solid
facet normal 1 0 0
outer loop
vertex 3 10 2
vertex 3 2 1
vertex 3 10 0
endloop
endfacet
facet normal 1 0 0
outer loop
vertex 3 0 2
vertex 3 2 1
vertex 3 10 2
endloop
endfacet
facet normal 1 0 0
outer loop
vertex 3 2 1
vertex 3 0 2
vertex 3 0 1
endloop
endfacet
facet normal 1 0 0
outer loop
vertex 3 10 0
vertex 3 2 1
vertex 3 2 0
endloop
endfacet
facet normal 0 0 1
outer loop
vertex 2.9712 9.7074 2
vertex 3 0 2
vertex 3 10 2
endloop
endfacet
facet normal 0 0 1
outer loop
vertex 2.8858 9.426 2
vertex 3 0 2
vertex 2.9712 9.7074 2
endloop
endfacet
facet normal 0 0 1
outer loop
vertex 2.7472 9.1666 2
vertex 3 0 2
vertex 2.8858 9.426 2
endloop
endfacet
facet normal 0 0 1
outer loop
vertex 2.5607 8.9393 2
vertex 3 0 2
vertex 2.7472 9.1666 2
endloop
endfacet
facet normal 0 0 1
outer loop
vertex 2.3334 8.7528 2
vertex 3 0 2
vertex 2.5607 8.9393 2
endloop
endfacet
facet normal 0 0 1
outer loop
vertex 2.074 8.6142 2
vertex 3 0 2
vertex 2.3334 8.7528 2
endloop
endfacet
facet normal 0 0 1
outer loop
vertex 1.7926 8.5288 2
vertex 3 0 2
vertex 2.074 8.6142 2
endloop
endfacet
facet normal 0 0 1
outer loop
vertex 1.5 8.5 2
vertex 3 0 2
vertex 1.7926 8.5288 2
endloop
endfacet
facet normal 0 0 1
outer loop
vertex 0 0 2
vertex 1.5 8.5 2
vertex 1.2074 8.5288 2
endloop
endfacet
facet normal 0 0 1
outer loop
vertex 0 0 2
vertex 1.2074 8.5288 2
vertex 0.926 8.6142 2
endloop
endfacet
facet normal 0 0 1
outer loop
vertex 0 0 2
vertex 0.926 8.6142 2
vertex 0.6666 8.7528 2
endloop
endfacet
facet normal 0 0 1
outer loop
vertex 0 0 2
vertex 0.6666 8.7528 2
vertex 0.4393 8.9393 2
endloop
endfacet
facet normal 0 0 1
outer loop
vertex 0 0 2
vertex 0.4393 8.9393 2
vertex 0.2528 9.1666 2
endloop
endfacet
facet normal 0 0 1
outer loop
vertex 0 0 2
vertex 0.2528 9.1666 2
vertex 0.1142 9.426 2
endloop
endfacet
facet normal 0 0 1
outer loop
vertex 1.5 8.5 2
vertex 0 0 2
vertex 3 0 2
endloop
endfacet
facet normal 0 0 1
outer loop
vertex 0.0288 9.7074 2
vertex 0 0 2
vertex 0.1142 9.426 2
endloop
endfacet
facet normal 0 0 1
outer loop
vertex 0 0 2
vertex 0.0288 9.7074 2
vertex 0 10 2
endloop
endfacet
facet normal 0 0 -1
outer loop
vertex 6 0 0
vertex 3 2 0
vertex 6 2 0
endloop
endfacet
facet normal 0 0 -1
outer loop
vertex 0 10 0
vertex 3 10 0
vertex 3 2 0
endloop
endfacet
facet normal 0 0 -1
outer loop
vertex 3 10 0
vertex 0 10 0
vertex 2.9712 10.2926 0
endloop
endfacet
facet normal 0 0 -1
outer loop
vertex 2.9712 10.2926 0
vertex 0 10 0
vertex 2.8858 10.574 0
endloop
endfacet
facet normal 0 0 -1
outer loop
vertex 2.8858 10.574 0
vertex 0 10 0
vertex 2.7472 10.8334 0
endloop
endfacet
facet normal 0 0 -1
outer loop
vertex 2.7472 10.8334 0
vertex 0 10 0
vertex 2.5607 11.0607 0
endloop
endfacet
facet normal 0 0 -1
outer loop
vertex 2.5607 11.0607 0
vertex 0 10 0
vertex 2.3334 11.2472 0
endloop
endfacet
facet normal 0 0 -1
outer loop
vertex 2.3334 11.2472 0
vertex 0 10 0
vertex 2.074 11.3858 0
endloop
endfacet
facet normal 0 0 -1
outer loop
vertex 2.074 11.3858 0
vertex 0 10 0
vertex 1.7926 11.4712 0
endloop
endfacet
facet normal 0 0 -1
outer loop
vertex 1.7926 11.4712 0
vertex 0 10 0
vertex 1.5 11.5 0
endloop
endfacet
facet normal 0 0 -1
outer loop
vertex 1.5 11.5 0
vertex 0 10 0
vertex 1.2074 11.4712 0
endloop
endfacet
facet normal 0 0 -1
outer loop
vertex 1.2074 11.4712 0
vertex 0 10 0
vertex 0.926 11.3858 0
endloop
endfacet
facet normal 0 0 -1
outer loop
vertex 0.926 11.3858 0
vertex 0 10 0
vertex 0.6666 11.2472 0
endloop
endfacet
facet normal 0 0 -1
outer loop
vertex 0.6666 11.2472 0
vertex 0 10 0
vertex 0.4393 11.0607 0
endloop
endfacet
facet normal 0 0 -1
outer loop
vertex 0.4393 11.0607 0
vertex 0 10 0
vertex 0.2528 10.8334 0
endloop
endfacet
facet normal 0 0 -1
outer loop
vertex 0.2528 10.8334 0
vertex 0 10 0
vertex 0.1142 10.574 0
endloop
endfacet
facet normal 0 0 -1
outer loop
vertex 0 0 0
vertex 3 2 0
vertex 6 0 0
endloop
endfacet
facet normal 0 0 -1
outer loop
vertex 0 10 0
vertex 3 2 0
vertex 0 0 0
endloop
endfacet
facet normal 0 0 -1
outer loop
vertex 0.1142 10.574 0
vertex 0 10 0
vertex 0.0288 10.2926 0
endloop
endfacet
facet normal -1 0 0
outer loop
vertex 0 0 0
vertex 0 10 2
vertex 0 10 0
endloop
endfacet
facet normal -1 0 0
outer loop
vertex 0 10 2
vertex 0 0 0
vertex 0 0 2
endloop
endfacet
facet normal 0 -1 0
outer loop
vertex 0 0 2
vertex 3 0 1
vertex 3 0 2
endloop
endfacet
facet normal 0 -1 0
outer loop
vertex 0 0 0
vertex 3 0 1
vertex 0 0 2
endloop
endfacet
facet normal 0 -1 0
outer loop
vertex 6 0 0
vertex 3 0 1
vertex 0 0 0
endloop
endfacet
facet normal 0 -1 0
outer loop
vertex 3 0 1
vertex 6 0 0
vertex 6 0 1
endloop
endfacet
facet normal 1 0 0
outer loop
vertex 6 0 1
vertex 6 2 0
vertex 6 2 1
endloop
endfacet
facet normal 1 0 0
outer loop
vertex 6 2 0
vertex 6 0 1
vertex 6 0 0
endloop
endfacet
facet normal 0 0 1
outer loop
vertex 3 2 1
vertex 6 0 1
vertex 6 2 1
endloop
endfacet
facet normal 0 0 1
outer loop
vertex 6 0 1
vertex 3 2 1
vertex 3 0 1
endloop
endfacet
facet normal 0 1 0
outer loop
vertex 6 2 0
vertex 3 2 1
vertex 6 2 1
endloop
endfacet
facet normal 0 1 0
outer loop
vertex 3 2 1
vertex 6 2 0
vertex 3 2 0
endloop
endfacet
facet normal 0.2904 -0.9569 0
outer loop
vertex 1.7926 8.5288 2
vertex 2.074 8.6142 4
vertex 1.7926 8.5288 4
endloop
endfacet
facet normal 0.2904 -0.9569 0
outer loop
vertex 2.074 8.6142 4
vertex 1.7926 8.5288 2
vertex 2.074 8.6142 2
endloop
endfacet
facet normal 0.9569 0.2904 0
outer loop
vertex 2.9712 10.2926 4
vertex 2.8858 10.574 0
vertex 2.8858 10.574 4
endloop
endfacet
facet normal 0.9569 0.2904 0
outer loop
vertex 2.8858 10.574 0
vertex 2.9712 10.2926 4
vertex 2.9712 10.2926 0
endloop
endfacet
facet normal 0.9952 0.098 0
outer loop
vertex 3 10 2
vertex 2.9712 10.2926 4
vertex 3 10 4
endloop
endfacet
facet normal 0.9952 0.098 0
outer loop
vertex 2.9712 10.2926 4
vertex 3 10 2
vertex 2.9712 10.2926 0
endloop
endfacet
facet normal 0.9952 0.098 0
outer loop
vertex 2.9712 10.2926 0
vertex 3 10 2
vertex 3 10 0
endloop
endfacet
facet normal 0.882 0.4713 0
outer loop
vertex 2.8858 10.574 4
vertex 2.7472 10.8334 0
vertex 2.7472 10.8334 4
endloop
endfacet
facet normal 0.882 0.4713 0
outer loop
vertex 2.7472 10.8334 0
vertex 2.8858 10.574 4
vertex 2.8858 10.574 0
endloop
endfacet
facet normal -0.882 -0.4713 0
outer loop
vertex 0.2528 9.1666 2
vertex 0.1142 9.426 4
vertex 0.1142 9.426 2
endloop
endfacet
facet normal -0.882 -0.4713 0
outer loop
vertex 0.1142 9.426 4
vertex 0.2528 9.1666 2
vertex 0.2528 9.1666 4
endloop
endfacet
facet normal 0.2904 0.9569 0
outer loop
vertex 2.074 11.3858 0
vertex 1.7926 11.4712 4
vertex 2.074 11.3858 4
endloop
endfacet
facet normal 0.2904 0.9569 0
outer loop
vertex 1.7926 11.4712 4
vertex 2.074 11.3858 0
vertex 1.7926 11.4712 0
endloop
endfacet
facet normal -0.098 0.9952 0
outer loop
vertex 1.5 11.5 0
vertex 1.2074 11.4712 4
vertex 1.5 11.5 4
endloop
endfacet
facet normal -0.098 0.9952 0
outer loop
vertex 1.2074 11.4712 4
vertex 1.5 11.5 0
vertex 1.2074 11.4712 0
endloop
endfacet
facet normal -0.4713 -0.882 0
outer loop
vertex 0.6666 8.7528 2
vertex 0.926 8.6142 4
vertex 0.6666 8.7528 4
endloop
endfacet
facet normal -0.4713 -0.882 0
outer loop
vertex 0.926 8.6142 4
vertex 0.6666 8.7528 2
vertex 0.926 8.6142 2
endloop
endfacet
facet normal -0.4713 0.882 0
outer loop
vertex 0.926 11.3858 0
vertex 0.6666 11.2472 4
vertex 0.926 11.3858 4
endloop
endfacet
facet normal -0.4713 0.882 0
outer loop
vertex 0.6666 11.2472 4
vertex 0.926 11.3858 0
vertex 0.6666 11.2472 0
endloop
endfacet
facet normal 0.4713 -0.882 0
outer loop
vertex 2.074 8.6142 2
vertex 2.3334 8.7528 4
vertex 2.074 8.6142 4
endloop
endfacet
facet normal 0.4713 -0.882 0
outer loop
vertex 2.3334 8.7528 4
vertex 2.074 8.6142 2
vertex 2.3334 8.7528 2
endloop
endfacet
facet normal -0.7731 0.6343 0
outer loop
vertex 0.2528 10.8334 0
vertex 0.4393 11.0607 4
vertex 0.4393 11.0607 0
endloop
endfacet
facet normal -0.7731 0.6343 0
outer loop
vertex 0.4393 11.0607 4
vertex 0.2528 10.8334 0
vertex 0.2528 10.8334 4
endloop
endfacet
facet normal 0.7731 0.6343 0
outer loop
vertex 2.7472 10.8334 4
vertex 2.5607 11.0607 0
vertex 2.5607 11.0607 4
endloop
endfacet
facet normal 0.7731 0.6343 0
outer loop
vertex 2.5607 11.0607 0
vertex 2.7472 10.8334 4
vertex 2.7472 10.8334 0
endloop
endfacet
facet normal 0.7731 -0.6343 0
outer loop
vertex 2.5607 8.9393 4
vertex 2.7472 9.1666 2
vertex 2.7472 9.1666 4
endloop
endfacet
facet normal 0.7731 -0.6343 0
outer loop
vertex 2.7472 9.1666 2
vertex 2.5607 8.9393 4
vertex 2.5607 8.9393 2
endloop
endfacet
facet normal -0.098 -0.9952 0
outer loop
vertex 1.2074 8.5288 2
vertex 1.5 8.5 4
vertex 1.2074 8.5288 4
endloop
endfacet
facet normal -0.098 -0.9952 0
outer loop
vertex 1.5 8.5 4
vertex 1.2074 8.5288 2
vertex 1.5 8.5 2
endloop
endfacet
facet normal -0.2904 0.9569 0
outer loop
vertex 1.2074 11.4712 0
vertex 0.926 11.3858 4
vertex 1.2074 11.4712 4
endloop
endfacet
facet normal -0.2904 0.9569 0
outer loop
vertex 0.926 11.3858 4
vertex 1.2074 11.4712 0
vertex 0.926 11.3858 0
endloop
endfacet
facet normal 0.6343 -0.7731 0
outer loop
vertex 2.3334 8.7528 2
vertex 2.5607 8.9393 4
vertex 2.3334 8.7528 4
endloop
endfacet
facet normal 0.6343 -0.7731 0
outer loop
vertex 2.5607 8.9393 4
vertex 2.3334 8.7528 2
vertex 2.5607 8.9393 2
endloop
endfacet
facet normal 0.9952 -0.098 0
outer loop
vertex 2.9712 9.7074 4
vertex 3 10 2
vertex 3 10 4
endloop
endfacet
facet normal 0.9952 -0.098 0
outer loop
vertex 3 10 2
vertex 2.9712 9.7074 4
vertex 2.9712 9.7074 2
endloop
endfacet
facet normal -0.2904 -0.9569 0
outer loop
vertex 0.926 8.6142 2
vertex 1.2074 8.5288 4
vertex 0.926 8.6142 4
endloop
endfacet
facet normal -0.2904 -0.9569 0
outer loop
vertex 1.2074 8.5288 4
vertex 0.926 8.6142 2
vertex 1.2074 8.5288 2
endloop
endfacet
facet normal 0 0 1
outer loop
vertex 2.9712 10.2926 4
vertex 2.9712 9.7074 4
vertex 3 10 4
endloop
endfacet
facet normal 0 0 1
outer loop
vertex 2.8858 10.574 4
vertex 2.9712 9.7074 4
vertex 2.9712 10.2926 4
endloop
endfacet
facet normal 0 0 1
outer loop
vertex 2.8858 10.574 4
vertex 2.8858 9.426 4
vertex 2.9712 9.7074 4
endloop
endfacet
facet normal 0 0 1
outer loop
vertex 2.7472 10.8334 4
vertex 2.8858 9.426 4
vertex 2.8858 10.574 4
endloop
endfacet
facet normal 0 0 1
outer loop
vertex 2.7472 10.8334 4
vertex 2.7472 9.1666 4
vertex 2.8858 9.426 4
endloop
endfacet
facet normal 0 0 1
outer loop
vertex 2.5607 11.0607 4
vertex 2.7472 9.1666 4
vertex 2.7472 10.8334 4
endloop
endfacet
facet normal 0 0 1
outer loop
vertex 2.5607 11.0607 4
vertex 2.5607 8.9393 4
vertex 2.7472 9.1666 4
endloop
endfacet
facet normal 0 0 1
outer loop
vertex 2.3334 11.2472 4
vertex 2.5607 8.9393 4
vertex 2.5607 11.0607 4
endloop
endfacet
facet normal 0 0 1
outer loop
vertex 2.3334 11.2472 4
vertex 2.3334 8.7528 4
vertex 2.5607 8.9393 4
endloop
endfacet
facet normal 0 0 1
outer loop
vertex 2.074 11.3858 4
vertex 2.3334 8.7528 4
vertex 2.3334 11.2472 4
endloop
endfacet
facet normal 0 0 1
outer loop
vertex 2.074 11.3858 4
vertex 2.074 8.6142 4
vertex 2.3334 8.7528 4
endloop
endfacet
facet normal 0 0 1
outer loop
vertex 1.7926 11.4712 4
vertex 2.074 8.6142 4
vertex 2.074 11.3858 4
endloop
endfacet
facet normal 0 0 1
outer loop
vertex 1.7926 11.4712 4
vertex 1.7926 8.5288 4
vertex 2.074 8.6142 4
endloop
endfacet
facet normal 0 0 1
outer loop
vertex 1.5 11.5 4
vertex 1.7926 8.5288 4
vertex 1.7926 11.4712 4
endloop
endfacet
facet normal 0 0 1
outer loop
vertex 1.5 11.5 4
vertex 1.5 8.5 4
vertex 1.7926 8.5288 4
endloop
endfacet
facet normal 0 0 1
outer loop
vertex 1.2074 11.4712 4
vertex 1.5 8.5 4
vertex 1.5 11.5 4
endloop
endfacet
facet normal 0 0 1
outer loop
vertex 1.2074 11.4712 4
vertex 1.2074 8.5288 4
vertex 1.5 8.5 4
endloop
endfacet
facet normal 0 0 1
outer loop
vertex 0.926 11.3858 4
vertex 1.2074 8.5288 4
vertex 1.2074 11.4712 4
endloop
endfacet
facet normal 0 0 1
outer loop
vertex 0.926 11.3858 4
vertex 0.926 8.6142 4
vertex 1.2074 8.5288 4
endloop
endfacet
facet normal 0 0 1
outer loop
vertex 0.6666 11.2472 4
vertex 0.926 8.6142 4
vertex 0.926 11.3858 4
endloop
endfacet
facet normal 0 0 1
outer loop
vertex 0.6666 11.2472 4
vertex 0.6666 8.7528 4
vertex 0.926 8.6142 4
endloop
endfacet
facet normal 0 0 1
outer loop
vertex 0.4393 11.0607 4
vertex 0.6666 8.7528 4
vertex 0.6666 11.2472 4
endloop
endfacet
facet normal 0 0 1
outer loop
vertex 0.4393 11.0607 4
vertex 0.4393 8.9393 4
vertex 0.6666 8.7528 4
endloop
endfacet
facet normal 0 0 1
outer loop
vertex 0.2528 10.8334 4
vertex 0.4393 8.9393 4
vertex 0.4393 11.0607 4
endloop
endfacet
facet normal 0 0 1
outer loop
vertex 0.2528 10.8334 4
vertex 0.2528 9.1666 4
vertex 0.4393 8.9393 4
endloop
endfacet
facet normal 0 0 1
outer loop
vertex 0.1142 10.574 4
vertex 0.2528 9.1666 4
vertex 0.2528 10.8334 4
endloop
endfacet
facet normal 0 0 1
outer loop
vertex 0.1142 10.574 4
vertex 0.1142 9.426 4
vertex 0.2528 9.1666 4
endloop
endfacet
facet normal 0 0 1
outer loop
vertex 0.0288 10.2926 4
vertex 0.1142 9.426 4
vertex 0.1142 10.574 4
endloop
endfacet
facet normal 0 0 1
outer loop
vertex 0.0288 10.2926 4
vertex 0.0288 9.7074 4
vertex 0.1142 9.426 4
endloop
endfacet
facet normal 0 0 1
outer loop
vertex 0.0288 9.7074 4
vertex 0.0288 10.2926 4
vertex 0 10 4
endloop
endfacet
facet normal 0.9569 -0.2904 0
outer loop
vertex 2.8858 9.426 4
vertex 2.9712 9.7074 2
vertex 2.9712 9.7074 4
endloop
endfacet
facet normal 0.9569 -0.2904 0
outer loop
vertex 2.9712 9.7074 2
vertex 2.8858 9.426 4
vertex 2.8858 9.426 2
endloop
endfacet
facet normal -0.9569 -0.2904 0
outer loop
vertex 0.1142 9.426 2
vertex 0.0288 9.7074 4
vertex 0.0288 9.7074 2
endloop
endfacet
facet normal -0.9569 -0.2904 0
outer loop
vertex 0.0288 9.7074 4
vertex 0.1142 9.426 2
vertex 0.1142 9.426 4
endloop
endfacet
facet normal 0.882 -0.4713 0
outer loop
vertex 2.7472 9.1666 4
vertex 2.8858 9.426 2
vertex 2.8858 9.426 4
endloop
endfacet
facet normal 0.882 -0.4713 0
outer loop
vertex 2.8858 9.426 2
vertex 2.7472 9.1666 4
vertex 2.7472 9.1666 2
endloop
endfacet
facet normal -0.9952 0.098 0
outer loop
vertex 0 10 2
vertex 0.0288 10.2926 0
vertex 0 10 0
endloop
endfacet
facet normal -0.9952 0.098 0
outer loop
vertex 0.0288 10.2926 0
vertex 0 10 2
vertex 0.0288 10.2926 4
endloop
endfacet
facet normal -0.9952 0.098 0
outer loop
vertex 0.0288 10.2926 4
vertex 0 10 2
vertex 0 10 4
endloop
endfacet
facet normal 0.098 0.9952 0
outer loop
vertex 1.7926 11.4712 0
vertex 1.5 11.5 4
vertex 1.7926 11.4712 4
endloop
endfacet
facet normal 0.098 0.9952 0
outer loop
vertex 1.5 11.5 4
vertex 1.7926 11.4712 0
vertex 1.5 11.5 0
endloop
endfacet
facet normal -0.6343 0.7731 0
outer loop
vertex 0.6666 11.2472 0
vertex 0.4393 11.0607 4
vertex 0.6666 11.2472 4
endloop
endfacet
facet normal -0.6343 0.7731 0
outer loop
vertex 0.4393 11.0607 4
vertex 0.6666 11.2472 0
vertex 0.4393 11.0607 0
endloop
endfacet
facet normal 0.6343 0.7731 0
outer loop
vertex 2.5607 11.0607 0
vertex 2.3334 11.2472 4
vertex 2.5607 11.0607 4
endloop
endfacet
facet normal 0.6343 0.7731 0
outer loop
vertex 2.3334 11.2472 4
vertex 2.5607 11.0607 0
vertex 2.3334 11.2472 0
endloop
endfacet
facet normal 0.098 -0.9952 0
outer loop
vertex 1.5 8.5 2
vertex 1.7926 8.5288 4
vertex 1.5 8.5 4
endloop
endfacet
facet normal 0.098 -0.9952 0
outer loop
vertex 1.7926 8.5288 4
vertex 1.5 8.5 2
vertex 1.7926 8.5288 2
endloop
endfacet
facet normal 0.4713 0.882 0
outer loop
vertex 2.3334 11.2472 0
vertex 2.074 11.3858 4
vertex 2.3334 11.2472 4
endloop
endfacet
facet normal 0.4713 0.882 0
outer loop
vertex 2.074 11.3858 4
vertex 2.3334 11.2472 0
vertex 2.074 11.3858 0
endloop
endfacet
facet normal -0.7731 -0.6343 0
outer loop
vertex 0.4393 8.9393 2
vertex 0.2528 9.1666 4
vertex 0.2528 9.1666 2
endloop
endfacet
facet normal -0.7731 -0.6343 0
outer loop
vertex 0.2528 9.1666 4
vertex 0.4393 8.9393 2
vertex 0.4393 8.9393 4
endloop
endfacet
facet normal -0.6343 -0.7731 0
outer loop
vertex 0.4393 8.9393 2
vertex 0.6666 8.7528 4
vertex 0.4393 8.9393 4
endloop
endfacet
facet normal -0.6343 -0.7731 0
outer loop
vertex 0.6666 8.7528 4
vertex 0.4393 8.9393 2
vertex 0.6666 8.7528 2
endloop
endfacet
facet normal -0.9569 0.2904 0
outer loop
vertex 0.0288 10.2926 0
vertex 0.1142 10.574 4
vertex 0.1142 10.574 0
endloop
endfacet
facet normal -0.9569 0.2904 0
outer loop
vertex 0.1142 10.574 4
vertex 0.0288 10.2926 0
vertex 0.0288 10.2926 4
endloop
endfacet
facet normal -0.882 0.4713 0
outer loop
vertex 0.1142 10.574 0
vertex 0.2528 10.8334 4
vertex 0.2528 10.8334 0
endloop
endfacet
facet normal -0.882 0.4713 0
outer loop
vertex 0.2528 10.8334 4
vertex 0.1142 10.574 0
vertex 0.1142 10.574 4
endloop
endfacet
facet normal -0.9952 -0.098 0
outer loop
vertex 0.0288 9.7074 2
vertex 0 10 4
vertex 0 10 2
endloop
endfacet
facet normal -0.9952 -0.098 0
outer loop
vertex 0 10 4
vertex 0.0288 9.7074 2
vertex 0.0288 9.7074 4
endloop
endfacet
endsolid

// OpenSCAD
module testObjekt() {
    union() {
        cube([3,10,2]);
        cube([6,2,1]);
        translate([1.5, 10,0]) cylinder(r=1.5, h=4, $fn=32);
    }
}

color("Lime", 0.3) testObjekt();
//scale([2,3,0.3]) testObjekt();
//translate([3,2,-4]) testObjekt();
//rotate([90,10,-35]) testObjekt();
//mirror([1,0,0]) testObjekt();
// testObjekt();
// testObjekt();
